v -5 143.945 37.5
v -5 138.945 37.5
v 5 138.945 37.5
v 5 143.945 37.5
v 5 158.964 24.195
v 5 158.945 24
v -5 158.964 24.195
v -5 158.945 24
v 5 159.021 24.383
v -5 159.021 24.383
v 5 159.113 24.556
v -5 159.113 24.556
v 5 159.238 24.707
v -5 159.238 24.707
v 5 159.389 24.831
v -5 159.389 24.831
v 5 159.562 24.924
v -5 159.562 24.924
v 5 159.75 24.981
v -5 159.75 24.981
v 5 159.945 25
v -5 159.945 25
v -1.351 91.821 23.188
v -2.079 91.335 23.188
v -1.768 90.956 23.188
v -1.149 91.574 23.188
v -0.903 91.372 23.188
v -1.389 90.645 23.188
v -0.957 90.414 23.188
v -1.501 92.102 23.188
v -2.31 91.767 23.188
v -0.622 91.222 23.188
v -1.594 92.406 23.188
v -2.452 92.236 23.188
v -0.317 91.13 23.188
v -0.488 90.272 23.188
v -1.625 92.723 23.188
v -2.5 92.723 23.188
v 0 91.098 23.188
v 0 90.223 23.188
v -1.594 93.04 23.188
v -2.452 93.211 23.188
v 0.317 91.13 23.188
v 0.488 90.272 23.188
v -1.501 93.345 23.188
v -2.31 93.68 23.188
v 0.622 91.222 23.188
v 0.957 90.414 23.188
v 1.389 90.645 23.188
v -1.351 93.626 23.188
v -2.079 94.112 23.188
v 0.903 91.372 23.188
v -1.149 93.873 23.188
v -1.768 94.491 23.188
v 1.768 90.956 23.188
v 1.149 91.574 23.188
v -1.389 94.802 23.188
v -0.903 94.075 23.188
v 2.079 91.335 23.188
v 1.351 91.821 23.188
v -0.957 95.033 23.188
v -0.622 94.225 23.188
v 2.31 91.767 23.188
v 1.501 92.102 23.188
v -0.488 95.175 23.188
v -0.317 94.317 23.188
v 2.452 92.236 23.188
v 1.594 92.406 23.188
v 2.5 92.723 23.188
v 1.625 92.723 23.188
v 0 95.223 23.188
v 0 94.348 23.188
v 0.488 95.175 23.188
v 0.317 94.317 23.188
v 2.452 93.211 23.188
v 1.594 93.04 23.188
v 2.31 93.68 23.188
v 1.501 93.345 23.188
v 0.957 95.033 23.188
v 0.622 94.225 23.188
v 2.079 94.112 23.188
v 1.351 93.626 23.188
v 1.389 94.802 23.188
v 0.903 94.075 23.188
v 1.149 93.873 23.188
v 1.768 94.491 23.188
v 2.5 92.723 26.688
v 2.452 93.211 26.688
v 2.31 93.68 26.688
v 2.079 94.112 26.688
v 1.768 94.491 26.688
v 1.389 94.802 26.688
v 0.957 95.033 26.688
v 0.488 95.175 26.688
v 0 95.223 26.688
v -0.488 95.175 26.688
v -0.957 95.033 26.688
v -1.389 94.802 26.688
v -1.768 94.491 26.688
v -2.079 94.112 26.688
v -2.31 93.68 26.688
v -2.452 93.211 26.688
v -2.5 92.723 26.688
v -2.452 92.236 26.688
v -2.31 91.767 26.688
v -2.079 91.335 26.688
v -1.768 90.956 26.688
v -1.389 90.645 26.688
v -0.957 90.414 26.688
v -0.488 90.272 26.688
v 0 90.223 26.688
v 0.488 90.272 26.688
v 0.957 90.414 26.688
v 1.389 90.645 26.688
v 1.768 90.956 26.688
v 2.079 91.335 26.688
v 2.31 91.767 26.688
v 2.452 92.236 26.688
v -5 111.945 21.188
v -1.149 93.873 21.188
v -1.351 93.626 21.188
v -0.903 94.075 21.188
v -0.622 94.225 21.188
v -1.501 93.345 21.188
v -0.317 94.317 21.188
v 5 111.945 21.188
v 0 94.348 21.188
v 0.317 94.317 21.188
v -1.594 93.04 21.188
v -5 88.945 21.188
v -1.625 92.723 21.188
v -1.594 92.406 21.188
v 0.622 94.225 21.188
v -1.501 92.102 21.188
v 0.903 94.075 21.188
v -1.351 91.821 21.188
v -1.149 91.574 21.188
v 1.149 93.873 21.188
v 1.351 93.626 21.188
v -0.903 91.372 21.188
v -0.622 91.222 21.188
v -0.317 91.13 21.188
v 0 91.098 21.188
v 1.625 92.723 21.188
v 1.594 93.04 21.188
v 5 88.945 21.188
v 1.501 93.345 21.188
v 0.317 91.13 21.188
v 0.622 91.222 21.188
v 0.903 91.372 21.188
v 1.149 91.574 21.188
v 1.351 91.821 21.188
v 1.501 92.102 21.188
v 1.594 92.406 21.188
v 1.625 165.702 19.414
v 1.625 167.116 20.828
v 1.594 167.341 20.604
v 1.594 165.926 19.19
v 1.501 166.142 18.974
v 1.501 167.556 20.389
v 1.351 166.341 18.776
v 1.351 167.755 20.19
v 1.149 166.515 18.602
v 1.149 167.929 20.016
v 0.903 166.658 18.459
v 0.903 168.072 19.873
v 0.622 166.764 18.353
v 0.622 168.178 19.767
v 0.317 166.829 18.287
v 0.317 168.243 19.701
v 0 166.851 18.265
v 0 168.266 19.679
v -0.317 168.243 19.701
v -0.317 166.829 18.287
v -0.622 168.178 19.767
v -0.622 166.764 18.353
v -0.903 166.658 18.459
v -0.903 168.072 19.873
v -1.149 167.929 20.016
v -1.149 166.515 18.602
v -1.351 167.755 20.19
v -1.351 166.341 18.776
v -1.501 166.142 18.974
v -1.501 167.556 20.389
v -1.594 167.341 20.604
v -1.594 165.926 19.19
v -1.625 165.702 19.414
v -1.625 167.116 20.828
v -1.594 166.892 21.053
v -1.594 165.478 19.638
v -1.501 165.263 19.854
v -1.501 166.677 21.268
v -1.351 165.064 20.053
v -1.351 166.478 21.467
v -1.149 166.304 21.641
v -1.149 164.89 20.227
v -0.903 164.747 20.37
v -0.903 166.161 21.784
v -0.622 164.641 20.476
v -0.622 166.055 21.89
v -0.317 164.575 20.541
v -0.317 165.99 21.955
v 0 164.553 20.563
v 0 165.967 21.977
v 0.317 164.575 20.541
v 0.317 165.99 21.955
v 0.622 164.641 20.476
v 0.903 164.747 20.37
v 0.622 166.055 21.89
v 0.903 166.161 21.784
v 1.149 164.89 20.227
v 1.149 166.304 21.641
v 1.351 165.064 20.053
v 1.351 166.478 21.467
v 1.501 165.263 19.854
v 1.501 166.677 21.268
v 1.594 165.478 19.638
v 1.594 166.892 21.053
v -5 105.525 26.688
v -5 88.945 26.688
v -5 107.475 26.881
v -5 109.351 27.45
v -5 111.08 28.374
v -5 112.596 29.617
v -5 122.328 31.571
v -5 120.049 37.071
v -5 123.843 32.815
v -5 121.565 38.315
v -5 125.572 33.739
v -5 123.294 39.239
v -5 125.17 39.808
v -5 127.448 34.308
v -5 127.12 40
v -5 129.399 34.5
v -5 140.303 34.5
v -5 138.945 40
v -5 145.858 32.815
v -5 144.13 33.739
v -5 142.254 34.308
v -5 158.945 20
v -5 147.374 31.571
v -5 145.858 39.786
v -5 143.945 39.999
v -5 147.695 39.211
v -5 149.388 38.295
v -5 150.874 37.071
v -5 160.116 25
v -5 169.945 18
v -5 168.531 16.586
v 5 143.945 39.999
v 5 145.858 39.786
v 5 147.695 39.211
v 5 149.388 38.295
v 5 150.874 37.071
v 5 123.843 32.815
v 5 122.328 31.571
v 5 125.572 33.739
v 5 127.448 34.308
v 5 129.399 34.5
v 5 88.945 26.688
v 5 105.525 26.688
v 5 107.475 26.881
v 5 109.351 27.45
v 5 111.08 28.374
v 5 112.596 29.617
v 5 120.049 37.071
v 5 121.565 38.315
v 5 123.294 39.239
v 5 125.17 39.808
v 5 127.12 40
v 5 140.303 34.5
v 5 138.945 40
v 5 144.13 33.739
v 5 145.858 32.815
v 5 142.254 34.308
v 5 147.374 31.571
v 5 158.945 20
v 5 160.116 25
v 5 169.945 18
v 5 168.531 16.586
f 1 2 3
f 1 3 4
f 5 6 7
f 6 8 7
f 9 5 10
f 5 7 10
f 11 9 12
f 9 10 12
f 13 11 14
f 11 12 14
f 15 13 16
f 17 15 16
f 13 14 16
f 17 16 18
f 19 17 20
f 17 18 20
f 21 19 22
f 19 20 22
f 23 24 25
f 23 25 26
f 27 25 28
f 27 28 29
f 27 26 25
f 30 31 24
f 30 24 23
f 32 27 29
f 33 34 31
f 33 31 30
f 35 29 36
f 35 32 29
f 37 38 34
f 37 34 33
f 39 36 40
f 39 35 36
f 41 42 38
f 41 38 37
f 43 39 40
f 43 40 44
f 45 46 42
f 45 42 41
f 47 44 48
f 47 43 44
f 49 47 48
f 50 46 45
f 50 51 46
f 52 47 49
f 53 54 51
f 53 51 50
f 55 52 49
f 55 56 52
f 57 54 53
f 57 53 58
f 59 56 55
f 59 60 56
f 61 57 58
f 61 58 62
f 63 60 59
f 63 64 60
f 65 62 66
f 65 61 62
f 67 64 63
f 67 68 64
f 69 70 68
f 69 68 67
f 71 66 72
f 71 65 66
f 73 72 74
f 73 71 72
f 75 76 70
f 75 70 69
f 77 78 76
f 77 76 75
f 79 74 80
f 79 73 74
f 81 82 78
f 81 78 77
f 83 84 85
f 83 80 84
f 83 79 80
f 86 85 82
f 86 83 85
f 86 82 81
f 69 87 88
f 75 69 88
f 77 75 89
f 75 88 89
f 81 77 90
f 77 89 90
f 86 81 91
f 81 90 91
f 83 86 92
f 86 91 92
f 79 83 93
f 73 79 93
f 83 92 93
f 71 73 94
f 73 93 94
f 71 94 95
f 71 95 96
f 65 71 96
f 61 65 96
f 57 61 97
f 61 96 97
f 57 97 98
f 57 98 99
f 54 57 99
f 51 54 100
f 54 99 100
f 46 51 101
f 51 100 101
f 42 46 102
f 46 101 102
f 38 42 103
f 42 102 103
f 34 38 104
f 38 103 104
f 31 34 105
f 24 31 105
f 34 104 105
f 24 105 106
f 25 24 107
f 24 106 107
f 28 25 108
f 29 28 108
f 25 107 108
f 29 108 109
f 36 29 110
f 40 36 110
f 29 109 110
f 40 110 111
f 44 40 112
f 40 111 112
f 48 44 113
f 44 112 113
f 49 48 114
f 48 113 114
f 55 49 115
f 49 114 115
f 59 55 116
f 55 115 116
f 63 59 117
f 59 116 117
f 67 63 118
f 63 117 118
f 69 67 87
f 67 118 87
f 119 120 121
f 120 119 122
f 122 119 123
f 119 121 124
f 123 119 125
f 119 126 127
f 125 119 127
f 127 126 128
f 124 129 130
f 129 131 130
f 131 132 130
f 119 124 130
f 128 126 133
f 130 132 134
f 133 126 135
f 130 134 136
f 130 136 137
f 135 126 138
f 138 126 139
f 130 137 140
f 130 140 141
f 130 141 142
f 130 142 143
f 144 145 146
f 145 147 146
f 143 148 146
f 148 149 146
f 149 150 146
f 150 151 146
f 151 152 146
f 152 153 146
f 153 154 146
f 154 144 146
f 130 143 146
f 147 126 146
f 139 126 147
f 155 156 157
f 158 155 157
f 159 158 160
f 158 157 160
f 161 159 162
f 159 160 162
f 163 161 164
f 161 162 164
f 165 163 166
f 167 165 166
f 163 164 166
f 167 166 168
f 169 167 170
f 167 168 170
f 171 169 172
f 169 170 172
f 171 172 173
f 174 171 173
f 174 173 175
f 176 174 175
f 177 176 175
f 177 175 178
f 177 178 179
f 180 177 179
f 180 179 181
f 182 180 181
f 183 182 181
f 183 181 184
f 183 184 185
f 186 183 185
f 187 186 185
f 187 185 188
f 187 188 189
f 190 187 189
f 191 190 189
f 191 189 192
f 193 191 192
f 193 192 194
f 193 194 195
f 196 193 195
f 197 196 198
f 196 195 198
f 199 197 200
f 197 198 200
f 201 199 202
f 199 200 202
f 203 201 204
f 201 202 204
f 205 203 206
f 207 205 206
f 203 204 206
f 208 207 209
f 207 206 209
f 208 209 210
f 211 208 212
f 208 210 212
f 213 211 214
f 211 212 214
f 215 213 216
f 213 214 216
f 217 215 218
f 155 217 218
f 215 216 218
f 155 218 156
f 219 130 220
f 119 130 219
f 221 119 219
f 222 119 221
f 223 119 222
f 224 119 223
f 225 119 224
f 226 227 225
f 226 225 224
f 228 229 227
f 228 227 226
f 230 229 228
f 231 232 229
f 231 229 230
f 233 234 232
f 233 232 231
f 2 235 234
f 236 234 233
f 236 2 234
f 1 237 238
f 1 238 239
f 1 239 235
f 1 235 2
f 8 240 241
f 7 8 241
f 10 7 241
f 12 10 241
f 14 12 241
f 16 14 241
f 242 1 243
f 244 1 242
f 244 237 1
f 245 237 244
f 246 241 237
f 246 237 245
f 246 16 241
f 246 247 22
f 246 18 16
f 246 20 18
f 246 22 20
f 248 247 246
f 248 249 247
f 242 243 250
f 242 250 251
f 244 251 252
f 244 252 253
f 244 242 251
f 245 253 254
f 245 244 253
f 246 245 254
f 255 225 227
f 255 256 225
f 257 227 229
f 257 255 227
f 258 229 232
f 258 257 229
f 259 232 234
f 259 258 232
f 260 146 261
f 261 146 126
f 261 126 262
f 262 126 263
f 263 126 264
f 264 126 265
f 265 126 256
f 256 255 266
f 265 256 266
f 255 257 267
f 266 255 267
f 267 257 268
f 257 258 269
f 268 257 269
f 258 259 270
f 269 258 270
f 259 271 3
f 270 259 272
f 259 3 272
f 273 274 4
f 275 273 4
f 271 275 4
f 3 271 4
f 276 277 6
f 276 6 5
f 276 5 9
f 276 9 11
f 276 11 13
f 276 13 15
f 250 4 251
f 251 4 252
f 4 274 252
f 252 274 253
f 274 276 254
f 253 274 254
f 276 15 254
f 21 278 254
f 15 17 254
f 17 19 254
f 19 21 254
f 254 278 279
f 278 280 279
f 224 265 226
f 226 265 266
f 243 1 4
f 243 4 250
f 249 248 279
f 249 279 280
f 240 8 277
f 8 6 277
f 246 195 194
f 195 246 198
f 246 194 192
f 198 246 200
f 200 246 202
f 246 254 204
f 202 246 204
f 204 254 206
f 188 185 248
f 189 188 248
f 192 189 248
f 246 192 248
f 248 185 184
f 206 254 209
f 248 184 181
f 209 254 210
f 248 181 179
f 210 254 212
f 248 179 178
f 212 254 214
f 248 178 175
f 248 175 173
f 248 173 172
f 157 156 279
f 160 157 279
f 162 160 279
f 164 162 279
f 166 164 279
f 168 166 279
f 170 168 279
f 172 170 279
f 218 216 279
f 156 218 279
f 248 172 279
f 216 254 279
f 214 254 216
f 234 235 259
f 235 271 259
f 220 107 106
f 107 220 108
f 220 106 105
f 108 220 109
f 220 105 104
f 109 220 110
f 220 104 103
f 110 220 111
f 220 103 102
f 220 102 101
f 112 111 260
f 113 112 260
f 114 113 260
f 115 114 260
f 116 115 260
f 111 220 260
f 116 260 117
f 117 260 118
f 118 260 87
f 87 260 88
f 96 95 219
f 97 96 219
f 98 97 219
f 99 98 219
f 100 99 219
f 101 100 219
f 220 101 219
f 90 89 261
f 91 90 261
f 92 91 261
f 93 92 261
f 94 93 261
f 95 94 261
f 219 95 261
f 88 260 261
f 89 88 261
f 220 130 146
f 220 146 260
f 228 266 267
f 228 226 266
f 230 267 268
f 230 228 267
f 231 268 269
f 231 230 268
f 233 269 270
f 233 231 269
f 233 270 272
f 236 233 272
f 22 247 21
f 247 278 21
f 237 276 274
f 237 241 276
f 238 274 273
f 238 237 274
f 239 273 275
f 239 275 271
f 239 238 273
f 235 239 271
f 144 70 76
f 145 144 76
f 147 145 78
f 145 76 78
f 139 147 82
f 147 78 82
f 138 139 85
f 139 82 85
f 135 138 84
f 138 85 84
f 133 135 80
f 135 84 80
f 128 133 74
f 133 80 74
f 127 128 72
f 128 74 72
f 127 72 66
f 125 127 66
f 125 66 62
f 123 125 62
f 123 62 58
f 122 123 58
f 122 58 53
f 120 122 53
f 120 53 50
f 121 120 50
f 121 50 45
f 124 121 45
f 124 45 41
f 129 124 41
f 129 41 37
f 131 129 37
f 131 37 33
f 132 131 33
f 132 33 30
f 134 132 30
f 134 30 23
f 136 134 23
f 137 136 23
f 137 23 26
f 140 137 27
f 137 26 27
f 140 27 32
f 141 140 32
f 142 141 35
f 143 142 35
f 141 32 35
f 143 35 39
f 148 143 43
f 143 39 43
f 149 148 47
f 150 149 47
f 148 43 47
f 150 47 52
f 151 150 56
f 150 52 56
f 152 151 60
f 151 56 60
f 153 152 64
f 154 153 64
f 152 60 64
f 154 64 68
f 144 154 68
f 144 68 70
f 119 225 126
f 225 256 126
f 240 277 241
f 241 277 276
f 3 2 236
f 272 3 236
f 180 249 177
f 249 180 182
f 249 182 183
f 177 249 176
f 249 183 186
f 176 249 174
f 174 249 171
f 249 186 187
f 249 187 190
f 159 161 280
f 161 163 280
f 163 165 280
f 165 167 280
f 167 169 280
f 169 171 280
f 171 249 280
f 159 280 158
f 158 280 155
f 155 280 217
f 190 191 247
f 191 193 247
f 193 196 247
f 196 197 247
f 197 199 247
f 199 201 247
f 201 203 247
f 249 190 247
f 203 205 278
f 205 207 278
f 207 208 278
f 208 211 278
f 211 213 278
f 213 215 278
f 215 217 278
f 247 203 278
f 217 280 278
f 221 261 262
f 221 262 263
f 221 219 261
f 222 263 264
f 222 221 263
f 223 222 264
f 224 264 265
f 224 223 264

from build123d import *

# Parameters (mm, degrees)
ESTRUSIONE_ESTRUSIONE1_DEPTH = 5
SCHIZZO2_R                   = 1.625
TAGLIO_ESTRUSIONE1_DEPTH     = 11.10267083
SCHIZZO3_R                   = 2.5
TAGLIO_ESTRUSIONE2_DEPTH     = 3.5
RACCORDO1_R                  = 10
SCHIZZO4_W                   = 2.5
SCHIZZO4_H                   = 5
TAGLIO_ESTRUSIONE3_DEPTH     = 10
RACCORDO2_R                  = 1
SCHIZZO5_R                   = 1.625
TAGLIO_ESTRUSIONE4_DEPTH     = 10


with BuildPart() as part:
    # Schizzo1 → Estrusione-Estrusione1 (new body, symmetric)
    with BuildSketch(Plane(origin=(0, 0, 0), x_dir=(0, 0, -1), z_dir=(1, 0, 0))):
        Polygon((-21.188457268, 88.94490566), (-26.688457268, 88.94490566), (-26.688457268, 109.666731067), (-40, 122.978273799), (-40, 147.94490566), (-18, 169.94490566), (-16.585786438, 168.530692098), (-25, 160.116478536), (-25, 158.94490566), (-20, 158.94490566), (-34.5, 144.44490566), (-34.5, 125.256448392), (-21.188457268, 111.94490566), align=None)
    extrude(amount=ESTRUSIONE_ESTRUSIONE1_DEPTH, both=True)

    # Schizzo2 → Taglio-Estrusione1 (cut, through all)
    with BuildSketch(Plane.XY.offset(26.688457268)):
        with Locations((0, 92.723474812)):
            Circle(SCHIZZO2_R)
    extrude(amount=-TAGLIO_ESTRUSIONE1_DEPTH, mode=Mode.SUBTRACT)

    # Schizzo3 → Taglio-Estrusione2 (cut)
    with BuildSketch(Plane.XY.offset(26.688457268)):
        with Locations((0, 92.723474812)):
            Circle(SCHIZZO3_R)
    extrude(amount=-TAGLIO_ESTRUSIONE2_DEPTH, mode=Mode.SUBTRACT)

    # Raccordo1
    raccordo1_edges = [part.edges().sort_by_distance(p)[0] for p in [
        (0, 109.666731067, 26.688457268),
        (0, 122.978273799, 40),
        (0, 147.94490566, 40),
        (0, 144.44490566, 34.5),
        (0, 125.256448392, 34.5),
    ]]
    fillet(raccordo1_edges, radius=RACCORDO1_R)

    # Schizzo4 → Taglio-Estrusione3 (cut)
    with BuildSketch(Plane.ZY.offset(5)):
        with Locations((38.75, 141.44490566)):
            Rectangle(SCHIZZO4_W, SCHIZZO4_H)
    extrude(amount=-TAGLIO_ESTRUSIONE3_DEPTH, mode=Mode.SUBTRACT)

    # Raccordo2
    raccordo2_edges = [part.edges().sort_by_distance(p)[0] for p in [
        (0, 158.94490566, 25),
    ]]
    fillet(raccordo2_edges, radius=RACCORDO2_R)

    # Schizzo5 → Taglio-Estrusione4 (cut)
    with BuildSketch(Plane(origin=(0, 93.97245283, 93.97245283), x_dir=(1, 0, 0), z_dir=(0, 0.707106781, 0.707106781))):
        with Locations((0, 103.441273159)):
            Circle(SCHIZZO5_R)
    extrude(amount=-TAGLIO_ESTRUSIONE4_DEPTH, mode=Mode.SUBTRACT)


solid = part.part
